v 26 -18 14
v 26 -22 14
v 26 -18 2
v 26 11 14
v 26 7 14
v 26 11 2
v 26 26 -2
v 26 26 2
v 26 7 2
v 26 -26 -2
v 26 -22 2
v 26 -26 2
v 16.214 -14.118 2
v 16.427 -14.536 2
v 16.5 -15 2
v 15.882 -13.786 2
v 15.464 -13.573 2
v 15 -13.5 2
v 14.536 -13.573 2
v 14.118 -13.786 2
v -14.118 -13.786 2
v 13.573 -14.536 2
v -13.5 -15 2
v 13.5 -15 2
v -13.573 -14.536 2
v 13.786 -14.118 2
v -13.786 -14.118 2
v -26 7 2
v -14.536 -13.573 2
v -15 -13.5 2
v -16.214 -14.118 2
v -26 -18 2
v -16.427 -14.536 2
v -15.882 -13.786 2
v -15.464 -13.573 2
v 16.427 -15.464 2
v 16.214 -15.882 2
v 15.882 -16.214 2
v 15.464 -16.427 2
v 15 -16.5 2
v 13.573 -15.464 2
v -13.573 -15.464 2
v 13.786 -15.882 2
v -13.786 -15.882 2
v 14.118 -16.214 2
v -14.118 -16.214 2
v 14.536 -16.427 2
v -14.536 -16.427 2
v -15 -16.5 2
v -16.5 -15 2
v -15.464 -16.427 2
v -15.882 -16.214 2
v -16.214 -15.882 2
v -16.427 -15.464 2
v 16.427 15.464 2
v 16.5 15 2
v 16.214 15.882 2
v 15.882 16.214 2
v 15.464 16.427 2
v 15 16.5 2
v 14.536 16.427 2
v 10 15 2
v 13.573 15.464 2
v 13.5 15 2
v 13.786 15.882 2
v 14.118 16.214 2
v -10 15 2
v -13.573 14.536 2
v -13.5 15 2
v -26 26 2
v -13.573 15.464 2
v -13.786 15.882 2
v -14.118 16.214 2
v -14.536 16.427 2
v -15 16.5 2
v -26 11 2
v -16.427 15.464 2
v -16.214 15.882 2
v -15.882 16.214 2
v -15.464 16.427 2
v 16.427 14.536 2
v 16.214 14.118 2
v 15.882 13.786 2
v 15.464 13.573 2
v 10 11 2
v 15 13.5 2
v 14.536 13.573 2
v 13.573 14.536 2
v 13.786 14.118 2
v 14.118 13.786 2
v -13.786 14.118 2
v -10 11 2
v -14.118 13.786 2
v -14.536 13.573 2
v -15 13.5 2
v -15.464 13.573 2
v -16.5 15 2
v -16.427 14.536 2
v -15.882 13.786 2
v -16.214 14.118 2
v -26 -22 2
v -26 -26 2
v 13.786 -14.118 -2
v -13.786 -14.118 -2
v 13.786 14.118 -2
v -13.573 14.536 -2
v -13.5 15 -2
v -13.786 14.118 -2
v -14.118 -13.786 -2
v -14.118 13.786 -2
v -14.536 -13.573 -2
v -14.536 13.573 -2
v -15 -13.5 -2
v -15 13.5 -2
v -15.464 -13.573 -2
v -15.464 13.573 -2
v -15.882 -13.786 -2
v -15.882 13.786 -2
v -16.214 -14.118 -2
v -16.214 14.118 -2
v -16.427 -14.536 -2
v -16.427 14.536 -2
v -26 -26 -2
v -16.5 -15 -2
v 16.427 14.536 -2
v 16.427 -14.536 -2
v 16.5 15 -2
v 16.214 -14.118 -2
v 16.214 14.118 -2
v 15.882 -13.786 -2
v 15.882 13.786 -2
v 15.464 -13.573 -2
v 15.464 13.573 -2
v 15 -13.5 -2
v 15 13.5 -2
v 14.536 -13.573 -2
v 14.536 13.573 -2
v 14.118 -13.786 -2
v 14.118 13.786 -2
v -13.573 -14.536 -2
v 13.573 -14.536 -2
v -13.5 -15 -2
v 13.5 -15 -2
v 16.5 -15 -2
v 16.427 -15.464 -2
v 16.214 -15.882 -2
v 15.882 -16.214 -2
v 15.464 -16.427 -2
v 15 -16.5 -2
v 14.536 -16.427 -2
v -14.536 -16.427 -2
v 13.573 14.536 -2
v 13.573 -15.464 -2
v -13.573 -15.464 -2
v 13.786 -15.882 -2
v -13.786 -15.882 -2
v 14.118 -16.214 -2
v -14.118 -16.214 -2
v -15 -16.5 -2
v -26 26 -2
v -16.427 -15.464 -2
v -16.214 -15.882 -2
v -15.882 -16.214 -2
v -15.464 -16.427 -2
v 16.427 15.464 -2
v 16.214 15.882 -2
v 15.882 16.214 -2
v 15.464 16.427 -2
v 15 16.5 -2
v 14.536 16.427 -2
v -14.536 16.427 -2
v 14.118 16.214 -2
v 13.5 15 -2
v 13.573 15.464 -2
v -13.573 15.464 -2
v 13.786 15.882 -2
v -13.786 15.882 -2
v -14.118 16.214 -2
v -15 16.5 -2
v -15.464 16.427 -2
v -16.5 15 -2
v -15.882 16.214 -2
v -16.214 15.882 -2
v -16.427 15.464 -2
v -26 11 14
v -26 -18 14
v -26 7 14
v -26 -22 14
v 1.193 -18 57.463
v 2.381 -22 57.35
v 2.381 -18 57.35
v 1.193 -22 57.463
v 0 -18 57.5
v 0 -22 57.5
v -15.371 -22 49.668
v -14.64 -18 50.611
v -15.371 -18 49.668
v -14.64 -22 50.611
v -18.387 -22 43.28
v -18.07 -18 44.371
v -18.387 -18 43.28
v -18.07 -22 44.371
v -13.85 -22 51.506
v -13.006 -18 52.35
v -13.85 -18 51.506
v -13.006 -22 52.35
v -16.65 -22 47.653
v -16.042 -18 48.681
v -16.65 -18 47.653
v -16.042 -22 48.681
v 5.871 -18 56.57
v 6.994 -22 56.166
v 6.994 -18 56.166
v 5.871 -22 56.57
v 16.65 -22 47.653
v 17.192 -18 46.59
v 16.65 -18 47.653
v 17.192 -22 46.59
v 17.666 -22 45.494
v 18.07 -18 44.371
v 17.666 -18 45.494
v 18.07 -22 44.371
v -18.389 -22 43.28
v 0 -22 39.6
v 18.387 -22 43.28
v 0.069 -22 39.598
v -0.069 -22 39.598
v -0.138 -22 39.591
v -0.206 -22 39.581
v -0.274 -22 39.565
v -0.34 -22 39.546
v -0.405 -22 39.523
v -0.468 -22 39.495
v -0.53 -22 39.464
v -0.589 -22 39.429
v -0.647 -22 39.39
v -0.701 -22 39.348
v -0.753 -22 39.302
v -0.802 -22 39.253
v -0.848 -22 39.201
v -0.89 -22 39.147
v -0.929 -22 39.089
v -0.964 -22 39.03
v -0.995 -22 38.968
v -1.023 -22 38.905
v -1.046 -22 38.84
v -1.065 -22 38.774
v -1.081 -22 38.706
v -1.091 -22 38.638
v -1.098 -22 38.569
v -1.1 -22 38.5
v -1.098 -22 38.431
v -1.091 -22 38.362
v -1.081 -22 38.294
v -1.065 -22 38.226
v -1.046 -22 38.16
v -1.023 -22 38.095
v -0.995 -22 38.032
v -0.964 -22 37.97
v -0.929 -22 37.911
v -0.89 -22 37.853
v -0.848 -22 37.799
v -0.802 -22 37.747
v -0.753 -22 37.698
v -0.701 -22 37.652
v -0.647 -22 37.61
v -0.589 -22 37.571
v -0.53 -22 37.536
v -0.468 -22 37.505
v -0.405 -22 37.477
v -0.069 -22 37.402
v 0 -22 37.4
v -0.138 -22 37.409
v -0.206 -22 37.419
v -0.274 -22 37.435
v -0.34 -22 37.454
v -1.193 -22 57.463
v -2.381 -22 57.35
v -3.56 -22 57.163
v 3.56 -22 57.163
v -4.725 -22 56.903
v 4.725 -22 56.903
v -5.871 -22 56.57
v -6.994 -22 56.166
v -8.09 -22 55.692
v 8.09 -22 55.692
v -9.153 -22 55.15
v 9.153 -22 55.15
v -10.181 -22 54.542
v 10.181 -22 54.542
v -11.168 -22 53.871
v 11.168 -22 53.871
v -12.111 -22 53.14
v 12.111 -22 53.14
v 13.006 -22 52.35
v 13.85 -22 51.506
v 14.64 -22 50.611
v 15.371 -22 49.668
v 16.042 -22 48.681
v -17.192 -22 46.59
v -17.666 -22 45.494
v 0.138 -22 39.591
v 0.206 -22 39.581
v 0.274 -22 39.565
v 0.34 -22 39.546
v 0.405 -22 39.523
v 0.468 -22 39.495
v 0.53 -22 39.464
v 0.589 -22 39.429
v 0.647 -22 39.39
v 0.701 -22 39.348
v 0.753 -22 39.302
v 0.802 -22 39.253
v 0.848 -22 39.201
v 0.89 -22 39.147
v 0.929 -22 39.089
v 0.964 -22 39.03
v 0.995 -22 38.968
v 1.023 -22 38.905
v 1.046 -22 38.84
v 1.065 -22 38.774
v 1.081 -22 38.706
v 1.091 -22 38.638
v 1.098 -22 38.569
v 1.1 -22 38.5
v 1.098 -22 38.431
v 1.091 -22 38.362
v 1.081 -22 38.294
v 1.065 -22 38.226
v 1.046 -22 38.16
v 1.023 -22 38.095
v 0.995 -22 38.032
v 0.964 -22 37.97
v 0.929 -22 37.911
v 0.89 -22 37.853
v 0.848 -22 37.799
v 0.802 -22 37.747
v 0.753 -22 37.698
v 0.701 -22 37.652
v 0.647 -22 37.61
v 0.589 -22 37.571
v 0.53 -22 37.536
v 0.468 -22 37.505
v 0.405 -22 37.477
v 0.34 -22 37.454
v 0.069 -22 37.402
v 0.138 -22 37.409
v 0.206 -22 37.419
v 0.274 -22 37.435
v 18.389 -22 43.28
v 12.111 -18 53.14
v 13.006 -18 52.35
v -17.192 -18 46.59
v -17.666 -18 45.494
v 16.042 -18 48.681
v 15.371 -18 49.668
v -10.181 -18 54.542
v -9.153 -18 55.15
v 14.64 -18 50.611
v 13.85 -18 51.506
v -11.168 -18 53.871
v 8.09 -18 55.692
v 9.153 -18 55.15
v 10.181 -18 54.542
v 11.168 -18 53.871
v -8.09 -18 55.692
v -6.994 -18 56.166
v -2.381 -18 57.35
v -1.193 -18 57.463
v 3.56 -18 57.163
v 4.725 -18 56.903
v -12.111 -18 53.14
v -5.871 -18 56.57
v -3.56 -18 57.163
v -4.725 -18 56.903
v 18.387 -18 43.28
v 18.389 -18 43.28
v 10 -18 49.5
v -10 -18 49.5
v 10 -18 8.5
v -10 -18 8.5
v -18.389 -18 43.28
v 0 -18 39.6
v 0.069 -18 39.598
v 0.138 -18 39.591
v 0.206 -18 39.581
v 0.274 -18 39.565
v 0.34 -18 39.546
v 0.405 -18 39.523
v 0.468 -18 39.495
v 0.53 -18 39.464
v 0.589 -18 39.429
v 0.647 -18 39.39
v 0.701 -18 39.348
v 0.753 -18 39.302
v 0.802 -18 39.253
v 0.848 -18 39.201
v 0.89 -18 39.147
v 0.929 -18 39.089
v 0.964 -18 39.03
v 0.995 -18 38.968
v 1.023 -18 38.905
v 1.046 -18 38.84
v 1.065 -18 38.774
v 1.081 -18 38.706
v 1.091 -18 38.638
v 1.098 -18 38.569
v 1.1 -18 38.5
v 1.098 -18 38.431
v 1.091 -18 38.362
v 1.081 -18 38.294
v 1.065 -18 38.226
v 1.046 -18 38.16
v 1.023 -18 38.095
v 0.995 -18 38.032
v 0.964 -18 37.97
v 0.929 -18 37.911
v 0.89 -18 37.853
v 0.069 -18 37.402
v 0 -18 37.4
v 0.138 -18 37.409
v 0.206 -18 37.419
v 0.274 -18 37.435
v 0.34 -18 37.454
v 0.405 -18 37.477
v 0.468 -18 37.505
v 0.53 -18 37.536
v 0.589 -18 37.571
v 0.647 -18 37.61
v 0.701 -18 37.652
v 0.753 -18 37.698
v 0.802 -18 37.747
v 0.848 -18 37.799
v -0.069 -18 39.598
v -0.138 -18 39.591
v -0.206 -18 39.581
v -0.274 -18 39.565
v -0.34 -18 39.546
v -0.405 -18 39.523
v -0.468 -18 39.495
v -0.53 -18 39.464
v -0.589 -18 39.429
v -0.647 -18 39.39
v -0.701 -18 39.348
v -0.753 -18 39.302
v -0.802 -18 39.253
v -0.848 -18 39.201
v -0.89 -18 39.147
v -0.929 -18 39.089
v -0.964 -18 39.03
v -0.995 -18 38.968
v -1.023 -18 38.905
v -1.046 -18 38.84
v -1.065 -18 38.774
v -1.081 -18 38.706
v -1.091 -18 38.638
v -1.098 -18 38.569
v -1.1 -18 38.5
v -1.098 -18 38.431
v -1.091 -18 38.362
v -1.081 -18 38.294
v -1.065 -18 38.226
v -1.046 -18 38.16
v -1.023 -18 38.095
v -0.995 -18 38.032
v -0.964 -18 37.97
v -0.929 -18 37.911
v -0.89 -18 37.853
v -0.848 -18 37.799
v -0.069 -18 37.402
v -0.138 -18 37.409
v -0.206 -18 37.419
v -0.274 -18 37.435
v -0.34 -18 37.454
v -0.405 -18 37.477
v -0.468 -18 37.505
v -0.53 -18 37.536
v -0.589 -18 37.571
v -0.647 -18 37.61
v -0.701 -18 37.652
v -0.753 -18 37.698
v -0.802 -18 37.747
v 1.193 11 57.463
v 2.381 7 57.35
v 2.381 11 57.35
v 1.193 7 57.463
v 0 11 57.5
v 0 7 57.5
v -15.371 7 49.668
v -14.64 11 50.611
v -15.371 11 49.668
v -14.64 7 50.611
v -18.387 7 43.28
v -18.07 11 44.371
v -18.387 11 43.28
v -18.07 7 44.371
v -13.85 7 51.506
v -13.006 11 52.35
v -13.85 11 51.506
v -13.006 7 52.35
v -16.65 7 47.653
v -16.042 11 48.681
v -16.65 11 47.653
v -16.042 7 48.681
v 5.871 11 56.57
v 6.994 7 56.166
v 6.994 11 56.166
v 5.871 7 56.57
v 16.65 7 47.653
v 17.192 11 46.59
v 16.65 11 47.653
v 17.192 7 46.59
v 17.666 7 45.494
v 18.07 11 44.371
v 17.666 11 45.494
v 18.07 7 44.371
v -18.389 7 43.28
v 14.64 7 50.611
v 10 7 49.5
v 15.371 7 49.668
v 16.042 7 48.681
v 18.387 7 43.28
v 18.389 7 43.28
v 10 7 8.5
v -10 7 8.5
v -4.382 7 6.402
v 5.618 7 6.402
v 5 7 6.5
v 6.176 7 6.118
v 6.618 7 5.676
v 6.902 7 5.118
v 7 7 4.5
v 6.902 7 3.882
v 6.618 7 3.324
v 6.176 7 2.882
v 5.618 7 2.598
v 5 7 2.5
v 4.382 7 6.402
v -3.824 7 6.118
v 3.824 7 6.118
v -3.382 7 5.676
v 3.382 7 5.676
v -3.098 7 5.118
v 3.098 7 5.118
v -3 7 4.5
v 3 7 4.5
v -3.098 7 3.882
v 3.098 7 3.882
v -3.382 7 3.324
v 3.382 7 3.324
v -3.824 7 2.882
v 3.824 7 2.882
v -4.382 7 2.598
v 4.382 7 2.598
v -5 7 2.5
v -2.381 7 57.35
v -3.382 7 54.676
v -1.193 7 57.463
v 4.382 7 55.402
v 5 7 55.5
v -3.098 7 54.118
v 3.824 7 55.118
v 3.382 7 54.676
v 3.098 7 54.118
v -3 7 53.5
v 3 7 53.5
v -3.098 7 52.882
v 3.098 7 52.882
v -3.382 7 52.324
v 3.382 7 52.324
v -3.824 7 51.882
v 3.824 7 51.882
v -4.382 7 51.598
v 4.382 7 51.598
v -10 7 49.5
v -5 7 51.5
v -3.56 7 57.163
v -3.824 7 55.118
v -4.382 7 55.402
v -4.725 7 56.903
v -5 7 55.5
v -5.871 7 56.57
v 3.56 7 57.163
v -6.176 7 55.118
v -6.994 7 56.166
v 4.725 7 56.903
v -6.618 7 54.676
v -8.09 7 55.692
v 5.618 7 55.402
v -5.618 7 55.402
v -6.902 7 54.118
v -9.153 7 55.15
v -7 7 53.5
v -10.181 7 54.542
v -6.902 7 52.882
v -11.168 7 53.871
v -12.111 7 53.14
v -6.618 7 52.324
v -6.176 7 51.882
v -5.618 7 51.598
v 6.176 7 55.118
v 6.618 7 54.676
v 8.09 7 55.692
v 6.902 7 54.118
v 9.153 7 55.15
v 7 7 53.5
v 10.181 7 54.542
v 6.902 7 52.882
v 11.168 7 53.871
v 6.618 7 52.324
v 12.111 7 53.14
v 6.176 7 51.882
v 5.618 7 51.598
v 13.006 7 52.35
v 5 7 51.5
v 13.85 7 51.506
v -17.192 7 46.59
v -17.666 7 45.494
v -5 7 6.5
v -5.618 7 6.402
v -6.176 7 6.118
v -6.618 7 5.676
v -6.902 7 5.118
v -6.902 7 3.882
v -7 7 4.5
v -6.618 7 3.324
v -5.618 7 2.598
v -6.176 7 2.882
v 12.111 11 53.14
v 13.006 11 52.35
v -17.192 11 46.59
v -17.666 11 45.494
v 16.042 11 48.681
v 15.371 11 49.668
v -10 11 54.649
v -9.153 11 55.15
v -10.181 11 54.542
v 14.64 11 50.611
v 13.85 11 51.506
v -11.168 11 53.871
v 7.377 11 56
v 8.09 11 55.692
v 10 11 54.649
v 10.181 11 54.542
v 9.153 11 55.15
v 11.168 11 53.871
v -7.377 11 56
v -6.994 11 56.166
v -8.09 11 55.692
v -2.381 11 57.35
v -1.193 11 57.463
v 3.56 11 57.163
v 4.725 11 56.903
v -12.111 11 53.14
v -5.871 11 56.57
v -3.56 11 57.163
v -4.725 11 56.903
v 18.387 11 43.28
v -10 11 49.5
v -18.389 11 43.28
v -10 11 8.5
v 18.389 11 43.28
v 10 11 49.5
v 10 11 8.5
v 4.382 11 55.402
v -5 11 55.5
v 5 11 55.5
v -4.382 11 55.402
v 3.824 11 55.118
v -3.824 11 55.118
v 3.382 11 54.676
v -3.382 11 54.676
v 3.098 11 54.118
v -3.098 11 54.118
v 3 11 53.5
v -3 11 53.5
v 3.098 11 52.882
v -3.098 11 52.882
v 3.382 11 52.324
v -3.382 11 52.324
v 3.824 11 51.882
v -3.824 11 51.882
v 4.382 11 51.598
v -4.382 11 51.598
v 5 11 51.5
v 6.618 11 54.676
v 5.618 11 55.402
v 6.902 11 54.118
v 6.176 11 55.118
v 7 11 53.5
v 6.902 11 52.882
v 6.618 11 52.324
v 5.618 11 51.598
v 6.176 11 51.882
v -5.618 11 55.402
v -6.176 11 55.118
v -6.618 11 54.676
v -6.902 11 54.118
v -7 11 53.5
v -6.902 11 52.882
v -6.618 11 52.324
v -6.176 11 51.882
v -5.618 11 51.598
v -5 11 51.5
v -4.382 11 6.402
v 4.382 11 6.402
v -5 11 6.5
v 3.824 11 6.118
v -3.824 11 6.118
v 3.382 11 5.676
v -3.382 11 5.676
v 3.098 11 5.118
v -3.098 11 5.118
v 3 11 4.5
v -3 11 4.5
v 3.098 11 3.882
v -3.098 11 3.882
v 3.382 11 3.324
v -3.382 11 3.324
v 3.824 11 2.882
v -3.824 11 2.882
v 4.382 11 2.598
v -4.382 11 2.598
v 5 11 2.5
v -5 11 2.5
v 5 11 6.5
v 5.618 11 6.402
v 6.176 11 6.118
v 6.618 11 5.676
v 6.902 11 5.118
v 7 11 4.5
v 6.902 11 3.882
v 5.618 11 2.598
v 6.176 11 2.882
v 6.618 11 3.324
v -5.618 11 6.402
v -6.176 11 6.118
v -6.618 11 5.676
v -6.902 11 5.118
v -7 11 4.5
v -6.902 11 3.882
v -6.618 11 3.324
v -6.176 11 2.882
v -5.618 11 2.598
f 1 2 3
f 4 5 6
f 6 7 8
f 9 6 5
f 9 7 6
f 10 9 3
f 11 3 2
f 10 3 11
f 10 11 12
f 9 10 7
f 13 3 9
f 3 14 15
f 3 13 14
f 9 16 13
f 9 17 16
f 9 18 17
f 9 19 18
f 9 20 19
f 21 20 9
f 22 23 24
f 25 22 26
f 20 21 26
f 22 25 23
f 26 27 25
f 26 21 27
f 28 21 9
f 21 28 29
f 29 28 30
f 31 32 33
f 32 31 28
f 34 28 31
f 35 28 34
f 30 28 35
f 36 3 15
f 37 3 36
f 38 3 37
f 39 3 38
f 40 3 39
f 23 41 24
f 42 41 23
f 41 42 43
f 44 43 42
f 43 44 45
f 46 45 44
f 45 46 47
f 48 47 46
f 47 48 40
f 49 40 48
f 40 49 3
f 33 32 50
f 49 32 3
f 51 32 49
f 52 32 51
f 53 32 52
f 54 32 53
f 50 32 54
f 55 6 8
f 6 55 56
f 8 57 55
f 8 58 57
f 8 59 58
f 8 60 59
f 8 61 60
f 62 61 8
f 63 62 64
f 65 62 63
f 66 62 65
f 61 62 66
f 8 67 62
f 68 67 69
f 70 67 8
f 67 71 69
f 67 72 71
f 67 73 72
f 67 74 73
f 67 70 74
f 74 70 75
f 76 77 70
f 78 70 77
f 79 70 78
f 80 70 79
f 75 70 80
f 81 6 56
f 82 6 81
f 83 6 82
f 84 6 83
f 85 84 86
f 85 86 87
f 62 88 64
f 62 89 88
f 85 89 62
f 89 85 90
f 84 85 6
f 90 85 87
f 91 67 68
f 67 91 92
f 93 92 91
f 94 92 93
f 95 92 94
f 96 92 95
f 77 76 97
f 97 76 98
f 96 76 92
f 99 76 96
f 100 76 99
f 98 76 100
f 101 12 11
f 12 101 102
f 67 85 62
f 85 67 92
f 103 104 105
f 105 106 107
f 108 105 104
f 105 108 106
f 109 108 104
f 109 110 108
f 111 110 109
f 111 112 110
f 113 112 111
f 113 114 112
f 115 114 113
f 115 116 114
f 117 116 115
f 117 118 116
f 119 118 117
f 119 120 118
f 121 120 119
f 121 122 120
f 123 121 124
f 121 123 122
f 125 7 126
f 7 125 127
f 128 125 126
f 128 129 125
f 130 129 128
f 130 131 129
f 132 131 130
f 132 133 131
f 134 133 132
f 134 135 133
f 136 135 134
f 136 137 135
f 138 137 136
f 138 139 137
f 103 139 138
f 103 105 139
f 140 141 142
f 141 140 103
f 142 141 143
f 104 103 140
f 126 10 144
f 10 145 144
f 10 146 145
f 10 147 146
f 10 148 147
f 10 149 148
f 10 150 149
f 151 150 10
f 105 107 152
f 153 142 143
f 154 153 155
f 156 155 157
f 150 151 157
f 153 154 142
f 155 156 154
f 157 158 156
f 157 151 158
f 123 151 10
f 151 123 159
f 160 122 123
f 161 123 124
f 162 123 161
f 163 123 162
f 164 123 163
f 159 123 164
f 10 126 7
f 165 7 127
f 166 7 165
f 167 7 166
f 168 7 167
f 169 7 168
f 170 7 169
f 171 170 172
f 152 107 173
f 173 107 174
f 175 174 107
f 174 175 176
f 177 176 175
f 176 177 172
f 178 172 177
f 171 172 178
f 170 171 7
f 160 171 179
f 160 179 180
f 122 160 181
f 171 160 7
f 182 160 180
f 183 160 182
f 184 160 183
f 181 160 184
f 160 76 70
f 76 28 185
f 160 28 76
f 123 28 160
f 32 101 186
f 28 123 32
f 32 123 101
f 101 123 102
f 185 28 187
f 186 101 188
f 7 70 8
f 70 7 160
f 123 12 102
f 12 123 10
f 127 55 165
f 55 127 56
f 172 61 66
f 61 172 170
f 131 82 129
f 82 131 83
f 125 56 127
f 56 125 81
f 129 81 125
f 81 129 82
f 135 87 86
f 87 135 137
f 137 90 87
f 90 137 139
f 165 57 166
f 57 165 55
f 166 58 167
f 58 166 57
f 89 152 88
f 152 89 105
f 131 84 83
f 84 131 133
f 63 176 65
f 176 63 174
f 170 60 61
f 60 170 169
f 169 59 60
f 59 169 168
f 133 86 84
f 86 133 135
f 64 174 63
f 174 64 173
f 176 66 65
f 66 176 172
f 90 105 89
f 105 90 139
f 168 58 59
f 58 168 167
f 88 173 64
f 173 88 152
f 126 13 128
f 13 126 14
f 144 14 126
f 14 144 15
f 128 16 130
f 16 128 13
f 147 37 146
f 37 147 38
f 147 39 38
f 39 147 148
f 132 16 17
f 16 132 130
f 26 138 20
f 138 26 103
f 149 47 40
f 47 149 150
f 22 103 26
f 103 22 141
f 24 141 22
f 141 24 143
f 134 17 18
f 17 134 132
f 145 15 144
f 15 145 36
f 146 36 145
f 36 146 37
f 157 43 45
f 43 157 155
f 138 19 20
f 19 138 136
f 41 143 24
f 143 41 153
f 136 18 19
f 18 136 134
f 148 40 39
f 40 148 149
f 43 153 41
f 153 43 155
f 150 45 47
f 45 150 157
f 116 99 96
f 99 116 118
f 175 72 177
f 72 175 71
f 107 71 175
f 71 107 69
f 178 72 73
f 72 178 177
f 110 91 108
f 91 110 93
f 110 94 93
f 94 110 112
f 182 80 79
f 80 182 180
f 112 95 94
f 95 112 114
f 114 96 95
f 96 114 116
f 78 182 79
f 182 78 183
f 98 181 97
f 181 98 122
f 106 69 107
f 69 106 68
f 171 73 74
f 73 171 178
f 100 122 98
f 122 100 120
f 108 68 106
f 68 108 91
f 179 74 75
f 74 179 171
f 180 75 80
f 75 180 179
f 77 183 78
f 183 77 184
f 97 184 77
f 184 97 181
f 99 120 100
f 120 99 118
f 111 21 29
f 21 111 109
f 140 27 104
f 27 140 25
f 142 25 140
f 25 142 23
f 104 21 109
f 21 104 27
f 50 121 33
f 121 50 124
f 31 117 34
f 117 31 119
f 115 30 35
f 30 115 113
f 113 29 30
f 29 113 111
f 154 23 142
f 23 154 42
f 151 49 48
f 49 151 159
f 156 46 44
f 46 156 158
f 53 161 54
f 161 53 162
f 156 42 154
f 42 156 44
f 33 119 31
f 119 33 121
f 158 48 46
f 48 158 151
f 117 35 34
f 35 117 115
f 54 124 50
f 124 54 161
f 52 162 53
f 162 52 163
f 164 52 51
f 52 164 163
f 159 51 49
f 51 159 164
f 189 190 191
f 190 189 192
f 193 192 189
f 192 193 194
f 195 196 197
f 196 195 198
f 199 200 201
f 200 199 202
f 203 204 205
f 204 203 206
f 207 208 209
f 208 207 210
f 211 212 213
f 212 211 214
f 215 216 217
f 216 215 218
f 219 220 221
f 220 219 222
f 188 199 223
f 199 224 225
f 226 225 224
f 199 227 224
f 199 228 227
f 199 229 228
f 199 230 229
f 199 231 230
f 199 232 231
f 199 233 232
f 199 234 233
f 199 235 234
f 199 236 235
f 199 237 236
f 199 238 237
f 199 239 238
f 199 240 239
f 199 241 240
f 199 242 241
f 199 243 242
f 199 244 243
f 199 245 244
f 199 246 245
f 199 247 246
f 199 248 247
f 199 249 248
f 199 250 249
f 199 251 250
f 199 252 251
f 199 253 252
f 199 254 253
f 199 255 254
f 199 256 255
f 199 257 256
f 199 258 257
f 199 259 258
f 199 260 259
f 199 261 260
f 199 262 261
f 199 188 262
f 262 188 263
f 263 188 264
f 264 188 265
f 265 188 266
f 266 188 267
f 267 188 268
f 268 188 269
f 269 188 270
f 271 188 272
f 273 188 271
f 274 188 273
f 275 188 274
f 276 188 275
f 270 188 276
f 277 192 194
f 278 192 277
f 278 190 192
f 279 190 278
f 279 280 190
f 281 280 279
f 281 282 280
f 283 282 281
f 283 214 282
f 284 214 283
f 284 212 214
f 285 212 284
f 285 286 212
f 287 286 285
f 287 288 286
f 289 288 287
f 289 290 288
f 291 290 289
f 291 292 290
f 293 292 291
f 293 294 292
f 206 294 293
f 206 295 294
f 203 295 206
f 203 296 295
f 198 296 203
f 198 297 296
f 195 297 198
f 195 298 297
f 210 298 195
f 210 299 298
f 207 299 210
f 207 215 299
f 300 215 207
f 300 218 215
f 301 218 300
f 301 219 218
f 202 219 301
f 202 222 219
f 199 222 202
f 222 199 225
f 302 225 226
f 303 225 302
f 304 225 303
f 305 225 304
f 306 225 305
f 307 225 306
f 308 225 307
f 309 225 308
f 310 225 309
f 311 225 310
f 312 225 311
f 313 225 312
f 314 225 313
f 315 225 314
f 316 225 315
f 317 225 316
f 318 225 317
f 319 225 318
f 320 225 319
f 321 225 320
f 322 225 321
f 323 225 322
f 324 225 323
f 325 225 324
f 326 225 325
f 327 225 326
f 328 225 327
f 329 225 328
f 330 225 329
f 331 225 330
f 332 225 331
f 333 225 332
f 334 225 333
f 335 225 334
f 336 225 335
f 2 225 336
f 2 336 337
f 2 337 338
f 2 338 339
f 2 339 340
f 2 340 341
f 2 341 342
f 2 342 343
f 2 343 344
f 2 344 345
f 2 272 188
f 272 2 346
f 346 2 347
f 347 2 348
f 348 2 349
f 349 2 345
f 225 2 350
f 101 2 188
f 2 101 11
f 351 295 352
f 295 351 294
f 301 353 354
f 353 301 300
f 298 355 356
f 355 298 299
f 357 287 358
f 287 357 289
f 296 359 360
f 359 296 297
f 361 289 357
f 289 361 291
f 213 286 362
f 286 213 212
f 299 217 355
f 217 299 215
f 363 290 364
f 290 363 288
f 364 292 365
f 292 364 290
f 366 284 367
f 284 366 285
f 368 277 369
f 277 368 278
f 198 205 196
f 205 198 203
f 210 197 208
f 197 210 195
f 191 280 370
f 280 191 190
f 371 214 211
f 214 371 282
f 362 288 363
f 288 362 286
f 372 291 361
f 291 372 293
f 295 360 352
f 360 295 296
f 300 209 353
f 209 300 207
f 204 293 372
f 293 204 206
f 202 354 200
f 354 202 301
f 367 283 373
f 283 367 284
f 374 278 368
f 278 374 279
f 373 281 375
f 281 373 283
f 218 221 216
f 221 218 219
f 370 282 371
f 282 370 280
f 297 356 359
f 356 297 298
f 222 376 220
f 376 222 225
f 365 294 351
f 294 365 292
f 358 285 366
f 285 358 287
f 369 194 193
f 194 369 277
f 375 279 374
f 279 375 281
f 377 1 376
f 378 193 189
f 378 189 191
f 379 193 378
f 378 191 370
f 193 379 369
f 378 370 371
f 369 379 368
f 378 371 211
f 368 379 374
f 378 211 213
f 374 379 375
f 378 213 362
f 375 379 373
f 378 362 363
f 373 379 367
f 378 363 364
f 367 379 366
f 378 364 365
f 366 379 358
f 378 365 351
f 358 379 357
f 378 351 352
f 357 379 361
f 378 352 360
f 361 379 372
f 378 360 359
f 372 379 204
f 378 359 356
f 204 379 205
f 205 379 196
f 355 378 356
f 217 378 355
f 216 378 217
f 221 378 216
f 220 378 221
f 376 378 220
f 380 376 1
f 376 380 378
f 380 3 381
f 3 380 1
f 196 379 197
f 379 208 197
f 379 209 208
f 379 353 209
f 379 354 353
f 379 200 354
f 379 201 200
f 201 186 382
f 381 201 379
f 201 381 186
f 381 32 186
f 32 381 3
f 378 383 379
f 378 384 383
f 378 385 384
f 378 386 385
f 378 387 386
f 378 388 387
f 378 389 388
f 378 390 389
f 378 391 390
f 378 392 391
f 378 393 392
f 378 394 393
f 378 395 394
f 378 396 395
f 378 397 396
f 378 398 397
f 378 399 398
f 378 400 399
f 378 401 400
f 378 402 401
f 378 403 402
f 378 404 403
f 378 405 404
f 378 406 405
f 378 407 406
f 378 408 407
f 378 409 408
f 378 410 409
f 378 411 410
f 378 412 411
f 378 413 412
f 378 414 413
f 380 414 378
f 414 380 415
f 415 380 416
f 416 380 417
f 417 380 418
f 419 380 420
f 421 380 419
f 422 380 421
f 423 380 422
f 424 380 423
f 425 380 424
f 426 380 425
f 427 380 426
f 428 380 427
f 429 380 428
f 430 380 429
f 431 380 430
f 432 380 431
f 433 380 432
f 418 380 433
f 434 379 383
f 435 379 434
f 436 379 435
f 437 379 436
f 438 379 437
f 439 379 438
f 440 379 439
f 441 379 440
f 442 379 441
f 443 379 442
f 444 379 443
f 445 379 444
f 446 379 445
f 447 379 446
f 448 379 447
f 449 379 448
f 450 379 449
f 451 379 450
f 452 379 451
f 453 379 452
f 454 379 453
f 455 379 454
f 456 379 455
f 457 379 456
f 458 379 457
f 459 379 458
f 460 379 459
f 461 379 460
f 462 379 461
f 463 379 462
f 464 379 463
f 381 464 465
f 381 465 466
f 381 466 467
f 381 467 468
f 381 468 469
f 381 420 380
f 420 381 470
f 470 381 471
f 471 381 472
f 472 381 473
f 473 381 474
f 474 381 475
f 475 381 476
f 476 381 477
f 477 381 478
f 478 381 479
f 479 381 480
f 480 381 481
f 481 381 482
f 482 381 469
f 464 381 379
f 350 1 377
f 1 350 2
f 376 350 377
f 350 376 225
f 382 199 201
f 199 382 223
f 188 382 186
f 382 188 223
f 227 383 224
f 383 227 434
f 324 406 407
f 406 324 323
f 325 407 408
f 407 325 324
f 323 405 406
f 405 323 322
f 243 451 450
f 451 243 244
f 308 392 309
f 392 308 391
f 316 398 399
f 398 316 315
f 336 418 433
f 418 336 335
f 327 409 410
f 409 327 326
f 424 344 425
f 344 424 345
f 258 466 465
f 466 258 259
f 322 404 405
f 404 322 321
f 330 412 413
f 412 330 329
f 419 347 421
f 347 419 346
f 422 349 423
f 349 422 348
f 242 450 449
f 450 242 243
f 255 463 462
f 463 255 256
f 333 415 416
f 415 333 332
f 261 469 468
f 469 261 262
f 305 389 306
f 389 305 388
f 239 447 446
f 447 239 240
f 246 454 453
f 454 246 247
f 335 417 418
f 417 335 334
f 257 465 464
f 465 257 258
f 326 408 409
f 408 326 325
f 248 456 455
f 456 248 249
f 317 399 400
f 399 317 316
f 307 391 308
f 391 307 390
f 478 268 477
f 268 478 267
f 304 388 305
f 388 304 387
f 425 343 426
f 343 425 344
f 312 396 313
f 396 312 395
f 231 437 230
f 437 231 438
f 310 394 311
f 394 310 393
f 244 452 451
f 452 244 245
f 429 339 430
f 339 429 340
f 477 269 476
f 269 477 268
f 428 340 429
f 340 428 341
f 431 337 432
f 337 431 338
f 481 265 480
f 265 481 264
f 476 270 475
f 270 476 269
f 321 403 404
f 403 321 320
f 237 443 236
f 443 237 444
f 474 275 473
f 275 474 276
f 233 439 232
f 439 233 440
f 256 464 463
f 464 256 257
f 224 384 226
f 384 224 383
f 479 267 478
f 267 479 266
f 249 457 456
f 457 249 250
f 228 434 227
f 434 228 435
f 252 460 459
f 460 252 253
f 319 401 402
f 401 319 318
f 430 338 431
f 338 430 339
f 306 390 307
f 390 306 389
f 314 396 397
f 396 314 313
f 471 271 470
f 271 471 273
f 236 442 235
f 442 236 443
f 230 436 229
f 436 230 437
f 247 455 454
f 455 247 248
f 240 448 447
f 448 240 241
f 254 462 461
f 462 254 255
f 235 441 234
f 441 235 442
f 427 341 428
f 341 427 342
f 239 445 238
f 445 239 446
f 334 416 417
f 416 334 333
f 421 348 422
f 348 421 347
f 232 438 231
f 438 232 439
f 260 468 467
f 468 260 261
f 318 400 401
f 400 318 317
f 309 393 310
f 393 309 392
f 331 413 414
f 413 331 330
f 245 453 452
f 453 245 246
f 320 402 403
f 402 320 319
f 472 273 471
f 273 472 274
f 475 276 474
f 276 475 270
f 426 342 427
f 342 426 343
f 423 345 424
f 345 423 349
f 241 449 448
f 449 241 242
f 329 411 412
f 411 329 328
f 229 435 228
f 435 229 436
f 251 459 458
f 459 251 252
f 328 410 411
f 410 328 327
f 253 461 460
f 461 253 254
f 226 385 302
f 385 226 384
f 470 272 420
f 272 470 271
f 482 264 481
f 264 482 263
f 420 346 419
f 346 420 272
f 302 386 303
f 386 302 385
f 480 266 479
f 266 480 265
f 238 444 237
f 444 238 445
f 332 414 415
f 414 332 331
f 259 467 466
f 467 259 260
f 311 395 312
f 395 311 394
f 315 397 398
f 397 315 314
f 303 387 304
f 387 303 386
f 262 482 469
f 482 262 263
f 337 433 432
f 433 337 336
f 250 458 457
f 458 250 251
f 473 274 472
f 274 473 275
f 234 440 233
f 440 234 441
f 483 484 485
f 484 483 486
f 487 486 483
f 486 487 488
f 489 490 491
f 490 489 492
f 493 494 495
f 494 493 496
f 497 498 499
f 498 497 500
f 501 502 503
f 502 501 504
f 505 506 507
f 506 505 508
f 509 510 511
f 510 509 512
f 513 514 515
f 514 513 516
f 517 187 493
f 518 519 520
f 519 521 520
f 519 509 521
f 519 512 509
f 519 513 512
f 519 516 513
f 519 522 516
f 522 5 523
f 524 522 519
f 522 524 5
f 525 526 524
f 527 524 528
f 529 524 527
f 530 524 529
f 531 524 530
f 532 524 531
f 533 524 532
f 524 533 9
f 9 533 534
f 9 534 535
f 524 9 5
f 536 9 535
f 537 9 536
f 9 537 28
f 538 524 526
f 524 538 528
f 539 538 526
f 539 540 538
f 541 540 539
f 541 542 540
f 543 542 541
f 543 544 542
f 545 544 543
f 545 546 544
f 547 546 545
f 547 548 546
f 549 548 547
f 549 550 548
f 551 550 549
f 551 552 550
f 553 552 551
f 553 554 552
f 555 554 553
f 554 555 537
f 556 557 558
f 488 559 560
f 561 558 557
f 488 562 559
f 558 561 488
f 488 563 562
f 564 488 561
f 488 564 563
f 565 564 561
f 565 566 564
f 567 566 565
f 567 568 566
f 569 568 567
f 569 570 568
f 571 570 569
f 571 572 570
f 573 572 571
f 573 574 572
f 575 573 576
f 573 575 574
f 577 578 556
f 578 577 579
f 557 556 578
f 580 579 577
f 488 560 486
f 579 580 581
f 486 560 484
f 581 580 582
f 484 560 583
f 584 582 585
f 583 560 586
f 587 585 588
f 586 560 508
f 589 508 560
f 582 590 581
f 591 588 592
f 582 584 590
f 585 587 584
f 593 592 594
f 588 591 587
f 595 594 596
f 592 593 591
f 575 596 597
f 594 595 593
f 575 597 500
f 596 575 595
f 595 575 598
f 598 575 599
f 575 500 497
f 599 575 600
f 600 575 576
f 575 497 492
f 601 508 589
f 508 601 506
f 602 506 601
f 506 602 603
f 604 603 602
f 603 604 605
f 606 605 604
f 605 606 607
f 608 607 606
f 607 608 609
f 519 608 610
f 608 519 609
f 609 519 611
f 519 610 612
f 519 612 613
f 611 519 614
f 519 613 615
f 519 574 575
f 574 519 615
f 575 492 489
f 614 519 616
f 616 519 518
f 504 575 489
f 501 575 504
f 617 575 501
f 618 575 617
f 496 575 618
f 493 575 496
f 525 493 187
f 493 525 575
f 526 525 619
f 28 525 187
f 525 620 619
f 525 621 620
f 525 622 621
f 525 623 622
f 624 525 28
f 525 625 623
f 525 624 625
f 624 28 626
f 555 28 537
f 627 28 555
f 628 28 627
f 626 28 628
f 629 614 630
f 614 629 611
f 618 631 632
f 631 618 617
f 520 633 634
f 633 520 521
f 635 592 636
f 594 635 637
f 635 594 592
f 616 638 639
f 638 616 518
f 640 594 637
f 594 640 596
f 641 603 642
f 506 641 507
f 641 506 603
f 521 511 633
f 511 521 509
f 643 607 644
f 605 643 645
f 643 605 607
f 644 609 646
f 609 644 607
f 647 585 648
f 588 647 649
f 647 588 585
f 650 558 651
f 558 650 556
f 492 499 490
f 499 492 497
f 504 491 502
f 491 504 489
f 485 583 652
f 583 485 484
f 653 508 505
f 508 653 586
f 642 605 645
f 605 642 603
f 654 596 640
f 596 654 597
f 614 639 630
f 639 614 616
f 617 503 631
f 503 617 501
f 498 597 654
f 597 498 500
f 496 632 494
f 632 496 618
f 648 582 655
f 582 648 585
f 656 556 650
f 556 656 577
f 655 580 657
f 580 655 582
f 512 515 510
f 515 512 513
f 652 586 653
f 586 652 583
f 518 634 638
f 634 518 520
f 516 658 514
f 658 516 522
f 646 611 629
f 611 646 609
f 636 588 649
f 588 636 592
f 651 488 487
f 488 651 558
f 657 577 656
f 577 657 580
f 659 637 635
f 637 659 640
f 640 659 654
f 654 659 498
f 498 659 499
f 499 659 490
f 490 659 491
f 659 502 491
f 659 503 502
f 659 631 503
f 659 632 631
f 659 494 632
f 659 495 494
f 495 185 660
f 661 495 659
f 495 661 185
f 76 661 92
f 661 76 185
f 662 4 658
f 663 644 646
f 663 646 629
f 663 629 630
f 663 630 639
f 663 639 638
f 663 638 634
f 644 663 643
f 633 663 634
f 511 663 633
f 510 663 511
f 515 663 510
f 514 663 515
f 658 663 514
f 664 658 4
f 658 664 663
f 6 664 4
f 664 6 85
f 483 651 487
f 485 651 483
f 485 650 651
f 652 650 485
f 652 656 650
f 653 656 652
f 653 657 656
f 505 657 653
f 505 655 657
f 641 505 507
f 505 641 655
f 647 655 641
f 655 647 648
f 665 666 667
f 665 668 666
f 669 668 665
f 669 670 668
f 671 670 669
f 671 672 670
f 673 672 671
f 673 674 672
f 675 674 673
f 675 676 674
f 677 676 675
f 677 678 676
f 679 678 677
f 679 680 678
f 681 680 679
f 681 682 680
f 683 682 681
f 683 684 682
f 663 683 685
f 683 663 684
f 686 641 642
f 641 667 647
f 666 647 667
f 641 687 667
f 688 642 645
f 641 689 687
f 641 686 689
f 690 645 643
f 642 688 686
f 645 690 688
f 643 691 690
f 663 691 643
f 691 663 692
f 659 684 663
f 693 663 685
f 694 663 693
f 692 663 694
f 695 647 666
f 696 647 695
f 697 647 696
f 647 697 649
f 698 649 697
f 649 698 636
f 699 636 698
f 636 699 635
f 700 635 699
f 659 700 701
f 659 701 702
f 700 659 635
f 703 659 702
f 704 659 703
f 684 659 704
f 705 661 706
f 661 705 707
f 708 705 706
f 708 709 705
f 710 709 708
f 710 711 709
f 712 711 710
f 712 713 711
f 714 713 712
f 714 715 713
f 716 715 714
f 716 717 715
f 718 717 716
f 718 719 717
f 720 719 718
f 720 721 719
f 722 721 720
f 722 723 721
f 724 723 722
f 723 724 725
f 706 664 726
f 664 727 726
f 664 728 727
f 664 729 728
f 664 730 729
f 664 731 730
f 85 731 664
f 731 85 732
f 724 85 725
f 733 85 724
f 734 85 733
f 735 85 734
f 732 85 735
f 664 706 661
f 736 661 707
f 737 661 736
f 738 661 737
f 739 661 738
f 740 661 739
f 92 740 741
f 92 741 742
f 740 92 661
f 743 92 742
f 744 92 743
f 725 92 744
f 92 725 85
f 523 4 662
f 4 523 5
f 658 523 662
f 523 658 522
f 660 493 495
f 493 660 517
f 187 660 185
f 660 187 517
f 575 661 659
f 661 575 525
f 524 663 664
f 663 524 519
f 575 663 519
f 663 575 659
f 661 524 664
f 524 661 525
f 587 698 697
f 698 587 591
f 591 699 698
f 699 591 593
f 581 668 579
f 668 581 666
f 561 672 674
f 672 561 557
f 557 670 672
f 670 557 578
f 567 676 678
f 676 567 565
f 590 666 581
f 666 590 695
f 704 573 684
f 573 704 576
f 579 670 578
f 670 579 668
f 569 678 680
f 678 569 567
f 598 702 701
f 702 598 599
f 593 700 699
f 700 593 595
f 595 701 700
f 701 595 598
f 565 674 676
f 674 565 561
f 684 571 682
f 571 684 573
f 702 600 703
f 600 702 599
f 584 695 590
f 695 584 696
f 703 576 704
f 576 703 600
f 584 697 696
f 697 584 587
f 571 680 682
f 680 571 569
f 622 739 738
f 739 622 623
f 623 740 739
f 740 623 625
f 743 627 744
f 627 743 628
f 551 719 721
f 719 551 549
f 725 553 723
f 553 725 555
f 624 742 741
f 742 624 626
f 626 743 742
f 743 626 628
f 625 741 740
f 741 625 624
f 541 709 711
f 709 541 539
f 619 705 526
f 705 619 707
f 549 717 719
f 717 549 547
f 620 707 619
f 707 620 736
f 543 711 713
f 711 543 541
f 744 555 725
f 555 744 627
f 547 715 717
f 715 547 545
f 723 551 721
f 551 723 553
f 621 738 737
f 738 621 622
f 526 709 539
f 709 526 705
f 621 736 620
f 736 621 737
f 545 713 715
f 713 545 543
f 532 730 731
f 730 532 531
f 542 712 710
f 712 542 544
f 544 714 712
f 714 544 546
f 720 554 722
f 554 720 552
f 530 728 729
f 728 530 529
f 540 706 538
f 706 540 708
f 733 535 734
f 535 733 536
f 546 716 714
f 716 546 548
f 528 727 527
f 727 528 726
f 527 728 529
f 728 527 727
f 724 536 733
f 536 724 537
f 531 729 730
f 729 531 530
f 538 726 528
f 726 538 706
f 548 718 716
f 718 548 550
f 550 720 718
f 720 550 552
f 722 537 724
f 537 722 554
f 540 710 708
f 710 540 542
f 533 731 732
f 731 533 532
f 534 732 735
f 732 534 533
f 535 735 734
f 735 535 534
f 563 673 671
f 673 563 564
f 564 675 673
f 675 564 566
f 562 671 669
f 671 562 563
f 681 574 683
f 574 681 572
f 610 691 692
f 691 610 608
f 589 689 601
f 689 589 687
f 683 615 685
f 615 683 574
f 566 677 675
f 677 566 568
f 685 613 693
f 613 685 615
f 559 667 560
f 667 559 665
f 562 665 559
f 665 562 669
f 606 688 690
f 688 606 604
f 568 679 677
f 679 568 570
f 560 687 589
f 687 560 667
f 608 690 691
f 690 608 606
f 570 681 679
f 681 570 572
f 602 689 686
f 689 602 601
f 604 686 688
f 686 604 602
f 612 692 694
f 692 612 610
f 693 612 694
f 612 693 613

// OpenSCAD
//-------------------------------------------------------------------------
//-- TEST01.scad
//-------------------------------------------------------------------------
//--This file has been generated automatically according to your data.
//--For more info, visit: http://iearobotics.com/oomlwiki/
//--------------------------------------------------------------------------

difference() {
  union() {
    difference() {
      cube(size=[52.000, 52.000, 4.000], center=true);
      translate(v=[15.000, 15.000, 0.000]) {
        cylinder(h=4.100, r1=1.500, r2=1.500, $fn=20, center=true);
      } // End translate
      translate(v=[15.000, -15.000, 0.000]) {
        cylinder(h=4.100, r1=1.500, r2=1.500, $fn=20, center=true);
      } // End translate
      translate(v=[-15.000, 15.000, 0.000]) {
        cylinder(h=4.100, r1=1.500, r2=1.500, $fn=20, center=true);
      } // End translate
      translate(v=[-15.000, -15.000, 0.000]) {
        cylinder(h=4.100, r1=1.500, r2=1.500, $fn=20, center=true);
      } // End translate
    } // End difference
    translate(v=[0.000, -18.000, 2.000]) {
      rotate(a=[90.000, 0.000, 0.000]) {
        difference() {
          union() {
            linear_extrude(height=4.000, twist=0, $fn=100, convexity=10, center=false) {
              translate(v=[0.000, 36.500, 0.000]) {
                circle(r=19.000, $fn=100);
              } // End translate
            } // End linear_extrude
            polyhedron(points=[[0.000, 0.000, 0.000], [0.000, 0.000, 4.000], [26.000, 0.000, 0.000], [26.000, 0.000, 4.000], [26.000, 12.000, 0.000], [26.000, 12.000, 4.000], [18.389, 41.280, 0.000], [18.389, 41.280, 4.000], [-18.389, 41.280, 0.000], [-18.389, 41.280, 4.000], [-26.000, 12.000, 0.000], [-26.000, 12.000, 4.000], [-26.000, 0.000, 0.000], [-26.000, 0.000, 4.000]], triangles=[[1, 3, 5], [12, 10, 0], [1, 5, 7], [10, 8, 0], [1, 7, 9], [8, 6, 0], [1, 9, 11], [6, 4, 0], [1, 11, 13], [4, 2, 0], [0, 3, 1], [0, 2, 3], [2, 5, 3], [2, 4, 5], [4, 7, 5], [4, 6, 7], [6, 9, 7], [6, 8, 9], [8, 11, 9], [8, 10, 11], [10, 13, 11], [10, 12, 13], [12, 1, 13], [12, 0, 1]]);
          } // End union
          translate(v=[0.000, 36.500, 2.000]) {
            cylinder(h=4.100, r1=1.100, r2=1.100, $fn=100, center=true);
          } // End translate
        } // End difference
      } // End rotate
    } // End translate
    translate(v=[0.000, 11.000, 2.000]) {
      rotate(a=[90.000, 0.000, 0.000]) {
        union() {
          linear_extrude(height=4.000, twist=0, $fn=100, convexity=10, center=false) {
            translate(v=[0.000, 36.500, 0.000]) {
              circle(r=19.000, $fn=100);
            } // End translate
          } // End linear_extrude
          polyhedron(points=[[0.000, 0.000, 0.000], [0.000, 0.000, 4.000], [26.000, 0.000, 0.000], [26.000, 0.000, 4.000], [26.000, 12.000, 0.000], [26.000, 12.000, 4.000], [18.389, 41.280, 0.000], [18.389, 41.280, 4.000], [-18.389, 41.280, 0.000], [-18.389, 41.280, 4.000], [-26.000, 12.000, 0.000], [-26.000, 12.000, 4.000], [-26.000, 0.000, 0.000], [-26.000, 0.000, 4.000]], triangles=[[1, 3, 5], [12, 10, 0], [1, 5, 7], [10, 8, 0], [1, 7, 9], [8, 6, 0], [1, 9, 11], [6, 4, 0], [1, 11, 13], [4, 2, 0], [0, 3, 1], [0, 2, 3], [2, 5, 3], [2, 4, 5], [4, 7, 5], [4, 6, 7], [6, 9, 7], [6, 8, 9], [8, 11, 9], [8, 10, 11], [10, 13, 11], [10, 12, 13], [12, 1, 13], [12, 0, 1]]);
        } // End union
      } // End rotate
    } // End translate
  } // End union
  translate(v=[0.000, -18.000, 8.500]) {
    rotate(a=[90.000, 0.000, 180.000]) {
      color([0.250, 0.250, 0.250, 1.000]) {
        union() {
          translate(v=[-10.000, 0.000, 0.000]) {
            cube(size=[20.000, 41.000, 38.000], center=false);
          } // End translate
          translate(v=[0.000, 30.000, 41.000]) {
            cylinder(h=6.000, r1=3.000, r2=3.000, $fn=20, center=true);
          } // End translate
          translate(v=[-10.000, 41.000, 29.000]) {
            cube(size=[20.000, 6.500, 4.000], center=false);
          } // End translate
          translate(v=[-10.000, -6.500, 29.000]) {
            cube(size=[20.000, 6.500, 4.000], center=false);
          } // End translate
          translate(v=[5.000, 45.000, 31.000]) {
            cylinder(h=12.100, r1=2.000, r2=2.000, $fn=20, center=true);
          } // End translate
          translate(v=[5.000, -4.000, 31.000]) {
            cylinder(h=12.100, r1=2.000, r2=2.000, $fn=20, center=true);
          } // End translate
          translate(v=[-5.000, -4.000, 31.000]) {
            cylinder(h=12.100, r1=2.000, r2=2.000, $fn=20, center=true);
          } // End translate
          translate(v=[-5.000, 45.000, 31.000]) {
            cylinder(h=12.100, r1=2.000, r2=2.000, $fn=20, center=true);
          } // End translate
        } // End union
      } // End color
    } // End rotate
  } // End translate
} // End difference
